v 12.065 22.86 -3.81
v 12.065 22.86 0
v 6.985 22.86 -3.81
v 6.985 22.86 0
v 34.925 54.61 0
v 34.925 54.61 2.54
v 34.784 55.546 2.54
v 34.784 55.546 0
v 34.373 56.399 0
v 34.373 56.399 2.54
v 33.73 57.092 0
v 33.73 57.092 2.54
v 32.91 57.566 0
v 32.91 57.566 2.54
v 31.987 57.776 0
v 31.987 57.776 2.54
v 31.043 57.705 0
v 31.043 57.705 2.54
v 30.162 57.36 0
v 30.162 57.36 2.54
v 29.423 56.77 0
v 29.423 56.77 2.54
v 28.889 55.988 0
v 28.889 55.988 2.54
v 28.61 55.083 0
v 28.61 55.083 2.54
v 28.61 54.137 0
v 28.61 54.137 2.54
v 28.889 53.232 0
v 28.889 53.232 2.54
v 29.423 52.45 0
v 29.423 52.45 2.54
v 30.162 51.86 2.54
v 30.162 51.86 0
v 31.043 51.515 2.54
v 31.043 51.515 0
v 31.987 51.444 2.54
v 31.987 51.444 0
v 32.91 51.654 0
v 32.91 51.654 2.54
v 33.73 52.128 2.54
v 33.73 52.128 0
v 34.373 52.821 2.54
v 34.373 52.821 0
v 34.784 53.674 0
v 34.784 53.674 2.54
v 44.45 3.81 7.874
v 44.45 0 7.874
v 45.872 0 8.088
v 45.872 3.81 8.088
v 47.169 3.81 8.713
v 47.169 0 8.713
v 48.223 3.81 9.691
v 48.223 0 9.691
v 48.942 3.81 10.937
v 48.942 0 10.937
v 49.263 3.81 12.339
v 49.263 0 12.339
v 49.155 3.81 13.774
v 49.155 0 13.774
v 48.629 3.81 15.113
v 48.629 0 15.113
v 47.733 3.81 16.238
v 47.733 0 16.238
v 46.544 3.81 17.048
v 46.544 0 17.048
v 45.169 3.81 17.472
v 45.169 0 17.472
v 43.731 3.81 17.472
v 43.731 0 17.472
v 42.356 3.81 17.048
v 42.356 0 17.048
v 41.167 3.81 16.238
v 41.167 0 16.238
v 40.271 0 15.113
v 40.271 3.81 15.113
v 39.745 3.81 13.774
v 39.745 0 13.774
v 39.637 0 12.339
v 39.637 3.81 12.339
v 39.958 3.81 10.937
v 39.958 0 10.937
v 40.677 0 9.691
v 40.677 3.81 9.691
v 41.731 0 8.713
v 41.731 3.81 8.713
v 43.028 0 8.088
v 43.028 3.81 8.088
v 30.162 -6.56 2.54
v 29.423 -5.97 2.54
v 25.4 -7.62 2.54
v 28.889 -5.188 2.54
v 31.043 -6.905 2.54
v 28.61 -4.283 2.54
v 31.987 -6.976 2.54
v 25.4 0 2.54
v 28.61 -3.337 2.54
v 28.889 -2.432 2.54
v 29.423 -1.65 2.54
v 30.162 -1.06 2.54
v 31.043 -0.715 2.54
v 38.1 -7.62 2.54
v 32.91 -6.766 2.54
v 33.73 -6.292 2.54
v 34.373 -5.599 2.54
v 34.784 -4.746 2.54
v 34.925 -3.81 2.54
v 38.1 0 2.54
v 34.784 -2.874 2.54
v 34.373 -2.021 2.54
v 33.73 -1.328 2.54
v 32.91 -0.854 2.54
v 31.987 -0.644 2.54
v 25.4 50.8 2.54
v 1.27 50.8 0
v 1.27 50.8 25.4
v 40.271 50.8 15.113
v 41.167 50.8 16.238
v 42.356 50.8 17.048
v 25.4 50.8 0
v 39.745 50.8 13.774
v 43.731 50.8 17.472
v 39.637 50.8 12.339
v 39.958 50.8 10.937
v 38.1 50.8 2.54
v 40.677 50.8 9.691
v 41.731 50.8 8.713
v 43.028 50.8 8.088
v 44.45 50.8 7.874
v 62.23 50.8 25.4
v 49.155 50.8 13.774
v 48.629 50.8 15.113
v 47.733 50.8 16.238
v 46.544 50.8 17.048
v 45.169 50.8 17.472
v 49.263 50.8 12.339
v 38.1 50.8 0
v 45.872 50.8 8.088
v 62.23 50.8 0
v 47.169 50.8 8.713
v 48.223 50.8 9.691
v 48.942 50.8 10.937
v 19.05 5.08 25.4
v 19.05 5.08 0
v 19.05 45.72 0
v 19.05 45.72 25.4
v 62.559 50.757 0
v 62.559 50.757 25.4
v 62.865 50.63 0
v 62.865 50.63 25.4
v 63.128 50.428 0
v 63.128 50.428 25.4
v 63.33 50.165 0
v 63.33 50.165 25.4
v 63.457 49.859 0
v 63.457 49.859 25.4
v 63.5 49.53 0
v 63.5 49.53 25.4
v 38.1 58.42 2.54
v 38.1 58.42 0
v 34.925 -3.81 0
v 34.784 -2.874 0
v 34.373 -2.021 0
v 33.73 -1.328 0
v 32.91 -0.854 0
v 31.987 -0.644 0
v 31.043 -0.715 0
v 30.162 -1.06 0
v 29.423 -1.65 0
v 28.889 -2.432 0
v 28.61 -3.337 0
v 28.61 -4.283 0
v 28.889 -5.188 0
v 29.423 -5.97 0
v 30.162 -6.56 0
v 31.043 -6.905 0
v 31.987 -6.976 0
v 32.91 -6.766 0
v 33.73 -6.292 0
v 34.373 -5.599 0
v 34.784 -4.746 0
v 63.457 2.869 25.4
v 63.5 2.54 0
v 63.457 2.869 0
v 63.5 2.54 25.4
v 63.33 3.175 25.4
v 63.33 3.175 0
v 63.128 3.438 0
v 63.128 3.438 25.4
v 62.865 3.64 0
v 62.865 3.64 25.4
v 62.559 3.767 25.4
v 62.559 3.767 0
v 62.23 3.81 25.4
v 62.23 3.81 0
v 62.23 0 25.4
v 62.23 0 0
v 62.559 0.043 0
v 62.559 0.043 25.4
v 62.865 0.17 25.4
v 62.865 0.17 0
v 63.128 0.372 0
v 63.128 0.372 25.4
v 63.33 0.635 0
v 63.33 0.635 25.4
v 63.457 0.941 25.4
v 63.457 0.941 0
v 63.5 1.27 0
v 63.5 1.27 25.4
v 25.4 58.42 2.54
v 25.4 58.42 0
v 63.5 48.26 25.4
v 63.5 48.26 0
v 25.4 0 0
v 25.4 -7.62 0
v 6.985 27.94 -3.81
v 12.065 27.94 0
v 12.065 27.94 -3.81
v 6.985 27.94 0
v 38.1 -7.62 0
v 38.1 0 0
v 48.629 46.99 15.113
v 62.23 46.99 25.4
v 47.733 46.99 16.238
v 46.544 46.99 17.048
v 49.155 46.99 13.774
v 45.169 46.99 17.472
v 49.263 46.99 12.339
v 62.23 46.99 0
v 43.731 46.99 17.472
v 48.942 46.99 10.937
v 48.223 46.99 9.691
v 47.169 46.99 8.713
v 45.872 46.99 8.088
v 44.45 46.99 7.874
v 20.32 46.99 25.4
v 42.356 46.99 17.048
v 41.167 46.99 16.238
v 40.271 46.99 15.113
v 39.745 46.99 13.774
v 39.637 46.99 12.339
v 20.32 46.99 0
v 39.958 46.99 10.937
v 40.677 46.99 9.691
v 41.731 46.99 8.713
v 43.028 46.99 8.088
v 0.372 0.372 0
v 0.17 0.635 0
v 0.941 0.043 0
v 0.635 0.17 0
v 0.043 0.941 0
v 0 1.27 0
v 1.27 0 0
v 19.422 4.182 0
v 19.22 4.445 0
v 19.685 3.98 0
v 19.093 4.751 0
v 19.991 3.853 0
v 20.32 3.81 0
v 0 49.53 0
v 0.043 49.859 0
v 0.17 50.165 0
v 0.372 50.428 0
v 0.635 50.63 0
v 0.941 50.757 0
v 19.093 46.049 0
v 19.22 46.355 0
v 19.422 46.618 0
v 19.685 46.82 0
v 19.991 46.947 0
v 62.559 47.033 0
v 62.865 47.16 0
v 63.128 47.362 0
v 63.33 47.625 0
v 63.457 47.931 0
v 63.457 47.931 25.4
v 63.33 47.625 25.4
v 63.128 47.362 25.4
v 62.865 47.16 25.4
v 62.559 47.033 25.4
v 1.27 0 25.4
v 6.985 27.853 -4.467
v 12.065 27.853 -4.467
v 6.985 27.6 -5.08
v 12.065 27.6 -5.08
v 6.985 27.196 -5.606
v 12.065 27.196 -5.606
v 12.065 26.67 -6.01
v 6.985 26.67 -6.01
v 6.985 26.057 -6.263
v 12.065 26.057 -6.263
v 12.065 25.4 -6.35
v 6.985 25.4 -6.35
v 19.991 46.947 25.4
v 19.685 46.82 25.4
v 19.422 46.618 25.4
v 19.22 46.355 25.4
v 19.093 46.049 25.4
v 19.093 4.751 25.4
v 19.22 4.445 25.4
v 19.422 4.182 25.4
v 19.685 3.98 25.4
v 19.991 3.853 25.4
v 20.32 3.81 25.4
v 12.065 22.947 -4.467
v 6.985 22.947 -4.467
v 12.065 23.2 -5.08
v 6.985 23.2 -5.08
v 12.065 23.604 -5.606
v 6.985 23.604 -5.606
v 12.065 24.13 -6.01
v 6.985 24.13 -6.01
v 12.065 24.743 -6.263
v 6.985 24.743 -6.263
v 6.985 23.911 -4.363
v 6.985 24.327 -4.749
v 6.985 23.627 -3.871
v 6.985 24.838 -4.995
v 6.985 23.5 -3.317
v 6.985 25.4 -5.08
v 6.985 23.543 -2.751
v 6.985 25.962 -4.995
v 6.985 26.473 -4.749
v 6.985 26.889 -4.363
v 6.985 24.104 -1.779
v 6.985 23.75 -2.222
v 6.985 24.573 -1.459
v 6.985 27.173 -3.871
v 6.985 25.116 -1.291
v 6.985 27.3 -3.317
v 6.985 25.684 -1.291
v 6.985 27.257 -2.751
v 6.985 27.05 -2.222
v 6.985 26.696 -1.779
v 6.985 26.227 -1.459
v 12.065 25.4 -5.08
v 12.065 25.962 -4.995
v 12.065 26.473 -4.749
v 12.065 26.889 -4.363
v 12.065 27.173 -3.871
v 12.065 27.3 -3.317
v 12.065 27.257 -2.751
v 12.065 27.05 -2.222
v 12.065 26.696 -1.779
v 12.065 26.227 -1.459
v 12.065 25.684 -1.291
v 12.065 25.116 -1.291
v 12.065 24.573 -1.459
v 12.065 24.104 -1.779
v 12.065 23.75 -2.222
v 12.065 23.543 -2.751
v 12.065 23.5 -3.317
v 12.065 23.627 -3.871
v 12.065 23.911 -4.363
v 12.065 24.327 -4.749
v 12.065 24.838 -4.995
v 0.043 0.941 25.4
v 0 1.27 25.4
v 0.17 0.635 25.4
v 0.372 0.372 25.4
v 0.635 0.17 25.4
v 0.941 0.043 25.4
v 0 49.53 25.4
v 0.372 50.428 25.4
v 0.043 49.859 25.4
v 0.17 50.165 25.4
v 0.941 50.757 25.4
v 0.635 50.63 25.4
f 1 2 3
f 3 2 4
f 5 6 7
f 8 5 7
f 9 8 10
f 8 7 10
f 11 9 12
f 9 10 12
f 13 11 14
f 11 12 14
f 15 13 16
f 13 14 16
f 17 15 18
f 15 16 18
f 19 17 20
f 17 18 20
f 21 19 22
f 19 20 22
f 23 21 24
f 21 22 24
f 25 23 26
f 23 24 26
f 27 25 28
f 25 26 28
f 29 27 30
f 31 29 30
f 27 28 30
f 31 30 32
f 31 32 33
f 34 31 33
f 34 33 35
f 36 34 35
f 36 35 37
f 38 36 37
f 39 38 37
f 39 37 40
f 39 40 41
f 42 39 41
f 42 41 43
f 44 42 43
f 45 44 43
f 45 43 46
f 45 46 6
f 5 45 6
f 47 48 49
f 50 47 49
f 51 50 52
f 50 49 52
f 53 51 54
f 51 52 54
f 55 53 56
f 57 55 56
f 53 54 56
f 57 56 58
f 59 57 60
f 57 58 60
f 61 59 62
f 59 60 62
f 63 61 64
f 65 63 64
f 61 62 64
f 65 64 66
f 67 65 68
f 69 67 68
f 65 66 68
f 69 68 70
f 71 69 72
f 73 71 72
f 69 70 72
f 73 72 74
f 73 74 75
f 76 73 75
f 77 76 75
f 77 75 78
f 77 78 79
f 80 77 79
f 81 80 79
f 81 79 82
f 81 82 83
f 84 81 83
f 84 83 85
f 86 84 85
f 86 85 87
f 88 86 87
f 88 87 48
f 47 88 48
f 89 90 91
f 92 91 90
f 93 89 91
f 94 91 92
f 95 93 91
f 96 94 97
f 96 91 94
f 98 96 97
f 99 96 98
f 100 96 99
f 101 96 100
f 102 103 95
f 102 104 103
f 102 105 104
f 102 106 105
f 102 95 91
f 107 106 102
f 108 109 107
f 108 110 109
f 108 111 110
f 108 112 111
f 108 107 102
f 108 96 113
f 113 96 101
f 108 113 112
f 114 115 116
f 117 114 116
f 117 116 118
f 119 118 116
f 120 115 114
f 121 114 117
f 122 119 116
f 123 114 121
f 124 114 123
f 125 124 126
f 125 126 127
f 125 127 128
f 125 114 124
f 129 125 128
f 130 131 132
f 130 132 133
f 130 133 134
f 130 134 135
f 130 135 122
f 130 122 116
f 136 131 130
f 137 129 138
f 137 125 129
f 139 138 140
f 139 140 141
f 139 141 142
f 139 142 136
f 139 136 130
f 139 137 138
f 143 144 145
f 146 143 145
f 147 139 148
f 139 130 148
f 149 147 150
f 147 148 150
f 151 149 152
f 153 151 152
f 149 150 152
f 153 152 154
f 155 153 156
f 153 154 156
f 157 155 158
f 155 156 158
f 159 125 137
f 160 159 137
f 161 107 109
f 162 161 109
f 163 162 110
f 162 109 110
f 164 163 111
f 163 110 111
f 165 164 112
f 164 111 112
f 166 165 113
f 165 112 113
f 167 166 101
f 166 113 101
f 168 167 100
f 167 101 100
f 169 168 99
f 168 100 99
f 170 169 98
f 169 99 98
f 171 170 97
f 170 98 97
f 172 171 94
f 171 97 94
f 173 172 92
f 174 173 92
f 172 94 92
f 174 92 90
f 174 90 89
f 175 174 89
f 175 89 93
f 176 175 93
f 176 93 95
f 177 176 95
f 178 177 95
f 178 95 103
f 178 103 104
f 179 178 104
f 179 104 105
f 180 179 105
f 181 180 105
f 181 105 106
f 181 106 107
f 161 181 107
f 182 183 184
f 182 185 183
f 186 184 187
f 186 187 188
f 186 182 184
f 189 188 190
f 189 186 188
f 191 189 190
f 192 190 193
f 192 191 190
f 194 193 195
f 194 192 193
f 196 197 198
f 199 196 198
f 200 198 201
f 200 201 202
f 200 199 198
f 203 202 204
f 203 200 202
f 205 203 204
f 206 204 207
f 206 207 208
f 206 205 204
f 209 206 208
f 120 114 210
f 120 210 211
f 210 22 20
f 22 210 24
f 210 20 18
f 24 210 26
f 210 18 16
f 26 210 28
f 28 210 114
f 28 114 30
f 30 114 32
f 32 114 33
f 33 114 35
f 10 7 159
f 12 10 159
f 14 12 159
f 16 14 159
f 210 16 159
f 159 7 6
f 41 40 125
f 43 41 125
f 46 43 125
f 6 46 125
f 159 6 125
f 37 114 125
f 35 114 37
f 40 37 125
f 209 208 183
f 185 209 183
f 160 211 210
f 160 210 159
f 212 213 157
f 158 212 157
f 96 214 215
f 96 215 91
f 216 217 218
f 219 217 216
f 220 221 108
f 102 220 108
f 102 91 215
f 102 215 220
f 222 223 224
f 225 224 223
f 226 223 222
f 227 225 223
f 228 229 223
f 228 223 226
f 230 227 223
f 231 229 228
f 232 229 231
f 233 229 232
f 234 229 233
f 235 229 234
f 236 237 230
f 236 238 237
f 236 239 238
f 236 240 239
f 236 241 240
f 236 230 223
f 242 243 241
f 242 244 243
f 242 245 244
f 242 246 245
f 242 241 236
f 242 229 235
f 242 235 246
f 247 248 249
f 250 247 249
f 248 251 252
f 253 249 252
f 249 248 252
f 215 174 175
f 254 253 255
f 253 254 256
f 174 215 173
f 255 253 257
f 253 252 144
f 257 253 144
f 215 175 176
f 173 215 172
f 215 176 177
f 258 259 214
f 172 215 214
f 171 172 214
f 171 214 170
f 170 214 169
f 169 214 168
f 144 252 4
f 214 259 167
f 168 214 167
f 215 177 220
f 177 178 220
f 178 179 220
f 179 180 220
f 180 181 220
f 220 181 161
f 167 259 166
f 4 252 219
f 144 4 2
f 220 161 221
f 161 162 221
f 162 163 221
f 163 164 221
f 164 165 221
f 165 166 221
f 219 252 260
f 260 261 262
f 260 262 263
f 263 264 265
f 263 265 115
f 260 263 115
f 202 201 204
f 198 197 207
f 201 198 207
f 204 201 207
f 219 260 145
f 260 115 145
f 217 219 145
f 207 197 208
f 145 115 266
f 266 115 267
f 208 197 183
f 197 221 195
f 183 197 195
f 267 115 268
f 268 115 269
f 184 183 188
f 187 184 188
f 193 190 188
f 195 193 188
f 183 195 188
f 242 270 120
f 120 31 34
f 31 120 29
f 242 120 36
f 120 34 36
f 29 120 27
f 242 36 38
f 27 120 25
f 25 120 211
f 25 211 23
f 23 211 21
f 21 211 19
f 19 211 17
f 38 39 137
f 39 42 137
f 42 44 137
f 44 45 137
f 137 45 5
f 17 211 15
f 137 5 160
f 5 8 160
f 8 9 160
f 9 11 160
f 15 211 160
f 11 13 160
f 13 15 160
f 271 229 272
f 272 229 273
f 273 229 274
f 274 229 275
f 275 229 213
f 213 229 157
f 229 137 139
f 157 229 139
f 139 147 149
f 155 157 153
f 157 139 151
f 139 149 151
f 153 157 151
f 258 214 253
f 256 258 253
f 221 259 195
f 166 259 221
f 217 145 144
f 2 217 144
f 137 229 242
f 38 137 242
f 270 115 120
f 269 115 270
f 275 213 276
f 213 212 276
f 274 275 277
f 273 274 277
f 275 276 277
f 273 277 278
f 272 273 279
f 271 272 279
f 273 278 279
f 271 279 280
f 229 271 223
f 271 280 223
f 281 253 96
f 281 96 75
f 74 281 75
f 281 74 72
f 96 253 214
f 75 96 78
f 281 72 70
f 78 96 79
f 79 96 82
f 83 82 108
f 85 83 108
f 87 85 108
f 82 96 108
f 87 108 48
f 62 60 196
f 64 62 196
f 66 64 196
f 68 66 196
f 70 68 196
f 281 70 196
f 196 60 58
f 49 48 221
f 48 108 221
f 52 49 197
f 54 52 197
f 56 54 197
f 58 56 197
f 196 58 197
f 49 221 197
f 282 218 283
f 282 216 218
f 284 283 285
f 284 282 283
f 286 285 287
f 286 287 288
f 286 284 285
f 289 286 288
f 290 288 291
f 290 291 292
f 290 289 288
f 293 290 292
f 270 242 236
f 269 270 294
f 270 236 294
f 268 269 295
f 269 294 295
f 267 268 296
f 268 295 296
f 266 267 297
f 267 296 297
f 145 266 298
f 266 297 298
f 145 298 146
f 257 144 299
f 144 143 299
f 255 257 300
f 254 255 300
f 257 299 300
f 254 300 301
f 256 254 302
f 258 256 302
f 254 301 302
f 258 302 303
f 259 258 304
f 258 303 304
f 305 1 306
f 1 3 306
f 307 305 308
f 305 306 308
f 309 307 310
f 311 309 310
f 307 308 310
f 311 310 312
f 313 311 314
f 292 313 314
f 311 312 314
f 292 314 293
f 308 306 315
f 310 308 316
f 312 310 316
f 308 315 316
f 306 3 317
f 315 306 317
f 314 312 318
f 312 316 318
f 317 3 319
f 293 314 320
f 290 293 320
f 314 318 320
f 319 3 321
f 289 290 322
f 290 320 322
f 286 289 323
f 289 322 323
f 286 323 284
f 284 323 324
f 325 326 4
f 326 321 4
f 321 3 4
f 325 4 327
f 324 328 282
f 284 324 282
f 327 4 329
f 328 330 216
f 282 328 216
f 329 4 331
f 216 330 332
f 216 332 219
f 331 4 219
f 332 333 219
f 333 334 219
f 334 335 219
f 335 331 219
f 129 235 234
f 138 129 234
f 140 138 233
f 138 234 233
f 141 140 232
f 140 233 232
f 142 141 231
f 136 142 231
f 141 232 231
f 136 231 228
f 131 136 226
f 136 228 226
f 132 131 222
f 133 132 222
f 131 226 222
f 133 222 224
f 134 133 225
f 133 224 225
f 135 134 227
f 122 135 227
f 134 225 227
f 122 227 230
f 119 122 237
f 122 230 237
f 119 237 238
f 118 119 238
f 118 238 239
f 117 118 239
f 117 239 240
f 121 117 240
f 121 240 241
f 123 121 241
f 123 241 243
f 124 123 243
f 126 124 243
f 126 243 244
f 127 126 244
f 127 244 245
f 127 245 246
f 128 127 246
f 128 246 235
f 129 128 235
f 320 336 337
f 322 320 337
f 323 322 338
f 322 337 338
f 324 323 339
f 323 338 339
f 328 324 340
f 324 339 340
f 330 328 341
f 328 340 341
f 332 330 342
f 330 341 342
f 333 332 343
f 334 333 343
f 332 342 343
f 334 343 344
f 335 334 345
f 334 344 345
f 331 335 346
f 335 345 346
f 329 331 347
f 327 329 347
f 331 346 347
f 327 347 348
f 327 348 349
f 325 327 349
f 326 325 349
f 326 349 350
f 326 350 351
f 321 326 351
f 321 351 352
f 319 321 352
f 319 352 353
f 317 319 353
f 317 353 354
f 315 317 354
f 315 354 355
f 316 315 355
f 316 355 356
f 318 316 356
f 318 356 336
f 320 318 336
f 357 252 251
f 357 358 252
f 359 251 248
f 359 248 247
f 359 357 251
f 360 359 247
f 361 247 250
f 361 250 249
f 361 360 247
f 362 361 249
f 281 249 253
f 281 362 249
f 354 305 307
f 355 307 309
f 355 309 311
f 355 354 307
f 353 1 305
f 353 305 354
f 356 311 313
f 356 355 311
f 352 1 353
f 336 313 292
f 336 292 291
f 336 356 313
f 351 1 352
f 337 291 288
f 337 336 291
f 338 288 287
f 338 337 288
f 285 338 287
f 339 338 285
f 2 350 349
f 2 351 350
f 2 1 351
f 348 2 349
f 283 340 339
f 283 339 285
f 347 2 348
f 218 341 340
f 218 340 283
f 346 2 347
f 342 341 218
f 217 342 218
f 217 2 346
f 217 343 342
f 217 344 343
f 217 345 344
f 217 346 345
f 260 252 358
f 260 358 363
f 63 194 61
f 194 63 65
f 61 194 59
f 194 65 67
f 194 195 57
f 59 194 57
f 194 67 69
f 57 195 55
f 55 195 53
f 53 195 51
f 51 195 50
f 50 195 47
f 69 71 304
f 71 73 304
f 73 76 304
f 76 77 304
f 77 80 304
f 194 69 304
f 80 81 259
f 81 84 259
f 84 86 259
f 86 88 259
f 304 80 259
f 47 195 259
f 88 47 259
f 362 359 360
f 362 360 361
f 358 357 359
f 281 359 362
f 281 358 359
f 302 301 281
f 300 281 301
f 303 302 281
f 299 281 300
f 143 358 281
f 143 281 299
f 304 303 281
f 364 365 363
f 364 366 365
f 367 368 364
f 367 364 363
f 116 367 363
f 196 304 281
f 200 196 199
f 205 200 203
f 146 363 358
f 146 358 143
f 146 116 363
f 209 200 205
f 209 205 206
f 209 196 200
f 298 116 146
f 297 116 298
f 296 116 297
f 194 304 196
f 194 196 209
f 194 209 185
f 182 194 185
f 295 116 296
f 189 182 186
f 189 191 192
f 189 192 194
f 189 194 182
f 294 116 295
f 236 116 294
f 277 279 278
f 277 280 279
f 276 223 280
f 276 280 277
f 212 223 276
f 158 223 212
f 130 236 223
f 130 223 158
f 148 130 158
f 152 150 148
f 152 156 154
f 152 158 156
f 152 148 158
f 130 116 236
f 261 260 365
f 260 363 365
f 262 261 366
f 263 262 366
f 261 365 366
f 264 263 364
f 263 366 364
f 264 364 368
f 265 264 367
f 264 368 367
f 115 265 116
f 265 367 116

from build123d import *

# Parameters (mm, degrees)
SKETCH1_W           = 63.5
SKETCH1_H           = 50.8
BOSS_EXTRUDE1_DEPTH = 25.4
SKETCH3_W           = 44.45
SKETCH3_H           = 43.18
CUT_EXTRUDE1_DEPTH  = 38.1
SKETCH5_R           = 4.826
CUT_EXTRUDE2_DEPTH  = 76.2
FILLET3_R           = 1.27
SKETCH10_W          = 12.7
SKETCH10_H          = 2.54
BOSS_EXTRUDE4_DEPTH = 7.62
SKETCH11_W          = 12.7
SKETCH11_H          = 2.54
BOSS_EXTRUDE5_DEPTH = 7.62
CUT_EXTRUDE5_REACH  = 91.262
SKETCH12_R          = 3.175
SKETCH13_W          = 5.08
SKETCH13_H          = 5.08
BOSS_EXTRUDE6_DEPTH = 6.35
CUT_EXTRUDE6_REACH  = 83.876
SKETCH15_R          = 1.905
FILLET5_R           = 2.54


with BuildPart() as part:
    # Sketch1 → Boss-Extrude1 (new body)
    with BuildSketch(Plane.XY):
        with Locations((31.75, 25.4)):
            Rectangle(SKETCH1_W, SKETCH1_H)
    extrude(amount=BOSS_EXTRUDE1_DEPTH)

    # Sketch3 → Cut-Extrude1 (cut)
    with BuildSketch(Plane(origin=(0, 0, 0), x_dir=(-1, 0, 0), z_dir=(0, 0, -1))):
        with Locations((-41.275, 25.4)):
            Rectangle(SKETCH3_W, SKETCH3_H)
    extrude(amount=-CUT_EXTRUDE1_DEPTH, mode=Mode.SUBTRACT)

    # Sketch5 → Cut-Extrude2 (cut)
    with BuildSketch(Plane.XZ):
        with Locations(Location((44.45, 12.7, 0), (0, 0, 270))):
            Circle(SKETCH5_R)
    extrude(amount=-CUT_EXTRUDE2_DEPTH, mode=Mode.SUBTRACT)

    # Fillet3
    fillet3_edges = [part.edges().sort_by_distance(p)[0] for p in [
        (63.5, 3.81, 12.7),
        (63.5, 46.99, 12.7),
        (19.05, 46.99, 12.7),
        (19.05, 3.81, 12.7),
        (0, 50.8, 12.7),
        (63.5, 50.8, 12.7),
        (63.5, 0, 12.7),
        (0, 0, 12.7),
    ]]
    fillet(fillet3_edges, radius=FILLET3_R)

    # Sketch10 → Boss-Extrude4 (add)
    with BuildSketch(Plane.XZ):
        with Locations((31.75, 1.27)):
            Rectangle(SKETCH10_W, SKETCH10_H)
    extrude(amount=BOSS_EXTRUDE4_DEPTH)

    # Sketch11 → Boss-Extrude5 (add)
    with BuildSketch(Plane(origin=(0, 50.8, 0), x_dir=(1, 0, 0), z_dir=(0, 1, 0))):
        with Locations((31.75, -1.27)):
            Rectangle(SKETCH11_W, SKETCH11_H)
    extrude(amount=BOSS_EXTRUDE5_DEPTH)

    # Sketch12 → Cut-Extrude5 (cut, up to next)
    with BuildSketch(Plane.XY.offset(2.54), mode=Mode.PRIVATE) as cut_extrude5_sk1:
        with Locations((31.75, 54.61)):
            Circle(SKETCH12_R)
    cut_extrude5_tool1 = extrude(cut_extrude5_sk1.sketch, amount=-CUT_EXTRUDE5_REACH, mode=Mode.PRIVATE) & part.part
    # Sketch12 → Cut-Extrude5 (cut, up to next)
    with BuildSketch(Plane.XY.offset(2.54), mode=Mode.PRIVATE) as cut_extrude5_sk2:
        with Locations((31.75, -3.81)):
            Circle(SKETCH12_R)
    cut_extrude5_tool2 = extrude(cut_extrude5_sk2.sketch, amount=-CUT_EXTRUDE5_REACH, mode=Mode.PRIVATE) & part.part
    add(cut_extrude5_tool1.solids().sort_by_distance((31.75, 54.61, 2.54))[0], mode=Mode.SUBTRACT)
    add(cut_extrude5_tool2.solids().sort_by_distance((31.75, -3.81, 2.54))[0], mode=Mode.SUBTRACT)

    # Sketch13 → Boss-Extrude6 (add)
    with BuildSketch(Plane(origin=(0, 0, 0), x_dir=(-1, 0, 0), z_dir=(0, 0, -1))):
        with Locations((-9.525, 25.4)):
            Rectangle(SKETCH13_W, SKETCH13_H)
    extrude(amount=BOSS_EXTRUDE6_DEPTH)

    # Sketch15 → Cut-Extrude6 (cut, up to next)
    with BuildSketch(Plane(origin=(12.065, 0, 0), x_dir=(0, 0, -1), z_dir=(1, 0, 0)), mode=Mode.PRIVATE) as cut_extrude6_sk1:
        with Locations((3.175, 25.4)):
            Circle(SKETCH15_R)
    cut_extrude6_tool1 = extrude(cut_extrude6_sk1.sketch, amount=-CUT_EXTRUDE6_REACH, mode=Mode.PRIVATE) & part.part
    add(cut_extrude6_tool1.solids().sort_by_distance((12.065, 25.4, -3.175))[0], mode=Mode.SUBTRACT)

    # Fillet5
    fillet5_edges = [part.edges().sort_by_distance(p)[0] for p in [
        (9.525, 27.94, -6.35),
        (9.525, 22.86, -6.35),
    ]]
    fillet(fillet5_edges, radius=FILLET5_R - 0.0001)  # a hair under: the kernel refuses the full size


solid = part.part
